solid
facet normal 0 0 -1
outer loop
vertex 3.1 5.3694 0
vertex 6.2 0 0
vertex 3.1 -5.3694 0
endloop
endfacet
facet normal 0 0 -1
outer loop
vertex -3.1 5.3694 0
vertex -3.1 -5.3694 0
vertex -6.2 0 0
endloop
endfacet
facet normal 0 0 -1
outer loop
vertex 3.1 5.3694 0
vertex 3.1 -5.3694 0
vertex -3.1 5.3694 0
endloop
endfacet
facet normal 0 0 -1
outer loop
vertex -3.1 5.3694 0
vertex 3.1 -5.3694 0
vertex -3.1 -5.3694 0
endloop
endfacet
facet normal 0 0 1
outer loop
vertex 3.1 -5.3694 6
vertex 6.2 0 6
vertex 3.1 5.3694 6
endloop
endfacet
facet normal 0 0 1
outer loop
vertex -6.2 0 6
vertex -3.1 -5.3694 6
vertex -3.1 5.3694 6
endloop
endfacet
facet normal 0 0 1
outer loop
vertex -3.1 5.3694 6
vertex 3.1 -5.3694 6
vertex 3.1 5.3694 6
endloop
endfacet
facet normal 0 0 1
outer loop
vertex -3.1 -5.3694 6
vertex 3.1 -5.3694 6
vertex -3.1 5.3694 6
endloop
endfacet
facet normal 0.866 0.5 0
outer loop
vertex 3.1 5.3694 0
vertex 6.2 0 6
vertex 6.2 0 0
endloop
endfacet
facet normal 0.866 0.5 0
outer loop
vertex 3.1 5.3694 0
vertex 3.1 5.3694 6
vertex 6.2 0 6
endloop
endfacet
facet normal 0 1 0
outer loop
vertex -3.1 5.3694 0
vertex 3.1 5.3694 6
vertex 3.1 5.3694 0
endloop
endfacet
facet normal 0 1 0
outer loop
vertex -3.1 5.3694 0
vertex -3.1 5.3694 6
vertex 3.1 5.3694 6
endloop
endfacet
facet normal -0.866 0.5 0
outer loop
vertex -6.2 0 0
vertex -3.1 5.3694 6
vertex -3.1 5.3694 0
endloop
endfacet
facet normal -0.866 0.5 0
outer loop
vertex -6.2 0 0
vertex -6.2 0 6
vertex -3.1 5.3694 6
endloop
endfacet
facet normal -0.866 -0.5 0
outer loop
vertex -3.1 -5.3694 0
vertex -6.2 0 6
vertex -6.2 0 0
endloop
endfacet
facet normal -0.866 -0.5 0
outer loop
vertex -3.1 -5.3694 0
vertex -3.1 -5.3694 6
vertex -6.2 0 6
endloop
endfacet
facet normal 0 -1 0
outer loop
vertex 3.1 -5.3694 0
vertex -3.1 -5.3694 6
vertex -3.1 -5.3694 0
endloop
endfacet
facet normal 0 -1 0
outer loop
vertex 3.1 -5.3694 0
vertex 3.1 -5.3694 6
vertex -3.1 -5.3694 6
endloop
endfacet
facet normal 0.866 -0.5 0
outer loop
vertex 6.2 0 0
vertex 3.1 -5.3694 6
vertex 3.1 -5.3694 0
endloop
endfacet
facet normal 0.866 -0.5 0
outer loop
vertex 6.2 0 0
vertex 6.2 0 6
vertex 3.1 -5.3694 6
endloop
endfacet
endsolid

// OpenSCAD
hex_prism(6.2,6);



module hex_prism(r,h){
    linear_extrude(height=h){
        hex(r);
    }
}

module hex(r){
    polygon(points = [[r,0],[r/2,r*sqrt(3)/2],
                [-r/2,r*sqrt(3)/2],[-r,0],
                [-r/2,-r*sqrt(3)/2],[r/2,-r*sqrt(3)/2]]);
}
